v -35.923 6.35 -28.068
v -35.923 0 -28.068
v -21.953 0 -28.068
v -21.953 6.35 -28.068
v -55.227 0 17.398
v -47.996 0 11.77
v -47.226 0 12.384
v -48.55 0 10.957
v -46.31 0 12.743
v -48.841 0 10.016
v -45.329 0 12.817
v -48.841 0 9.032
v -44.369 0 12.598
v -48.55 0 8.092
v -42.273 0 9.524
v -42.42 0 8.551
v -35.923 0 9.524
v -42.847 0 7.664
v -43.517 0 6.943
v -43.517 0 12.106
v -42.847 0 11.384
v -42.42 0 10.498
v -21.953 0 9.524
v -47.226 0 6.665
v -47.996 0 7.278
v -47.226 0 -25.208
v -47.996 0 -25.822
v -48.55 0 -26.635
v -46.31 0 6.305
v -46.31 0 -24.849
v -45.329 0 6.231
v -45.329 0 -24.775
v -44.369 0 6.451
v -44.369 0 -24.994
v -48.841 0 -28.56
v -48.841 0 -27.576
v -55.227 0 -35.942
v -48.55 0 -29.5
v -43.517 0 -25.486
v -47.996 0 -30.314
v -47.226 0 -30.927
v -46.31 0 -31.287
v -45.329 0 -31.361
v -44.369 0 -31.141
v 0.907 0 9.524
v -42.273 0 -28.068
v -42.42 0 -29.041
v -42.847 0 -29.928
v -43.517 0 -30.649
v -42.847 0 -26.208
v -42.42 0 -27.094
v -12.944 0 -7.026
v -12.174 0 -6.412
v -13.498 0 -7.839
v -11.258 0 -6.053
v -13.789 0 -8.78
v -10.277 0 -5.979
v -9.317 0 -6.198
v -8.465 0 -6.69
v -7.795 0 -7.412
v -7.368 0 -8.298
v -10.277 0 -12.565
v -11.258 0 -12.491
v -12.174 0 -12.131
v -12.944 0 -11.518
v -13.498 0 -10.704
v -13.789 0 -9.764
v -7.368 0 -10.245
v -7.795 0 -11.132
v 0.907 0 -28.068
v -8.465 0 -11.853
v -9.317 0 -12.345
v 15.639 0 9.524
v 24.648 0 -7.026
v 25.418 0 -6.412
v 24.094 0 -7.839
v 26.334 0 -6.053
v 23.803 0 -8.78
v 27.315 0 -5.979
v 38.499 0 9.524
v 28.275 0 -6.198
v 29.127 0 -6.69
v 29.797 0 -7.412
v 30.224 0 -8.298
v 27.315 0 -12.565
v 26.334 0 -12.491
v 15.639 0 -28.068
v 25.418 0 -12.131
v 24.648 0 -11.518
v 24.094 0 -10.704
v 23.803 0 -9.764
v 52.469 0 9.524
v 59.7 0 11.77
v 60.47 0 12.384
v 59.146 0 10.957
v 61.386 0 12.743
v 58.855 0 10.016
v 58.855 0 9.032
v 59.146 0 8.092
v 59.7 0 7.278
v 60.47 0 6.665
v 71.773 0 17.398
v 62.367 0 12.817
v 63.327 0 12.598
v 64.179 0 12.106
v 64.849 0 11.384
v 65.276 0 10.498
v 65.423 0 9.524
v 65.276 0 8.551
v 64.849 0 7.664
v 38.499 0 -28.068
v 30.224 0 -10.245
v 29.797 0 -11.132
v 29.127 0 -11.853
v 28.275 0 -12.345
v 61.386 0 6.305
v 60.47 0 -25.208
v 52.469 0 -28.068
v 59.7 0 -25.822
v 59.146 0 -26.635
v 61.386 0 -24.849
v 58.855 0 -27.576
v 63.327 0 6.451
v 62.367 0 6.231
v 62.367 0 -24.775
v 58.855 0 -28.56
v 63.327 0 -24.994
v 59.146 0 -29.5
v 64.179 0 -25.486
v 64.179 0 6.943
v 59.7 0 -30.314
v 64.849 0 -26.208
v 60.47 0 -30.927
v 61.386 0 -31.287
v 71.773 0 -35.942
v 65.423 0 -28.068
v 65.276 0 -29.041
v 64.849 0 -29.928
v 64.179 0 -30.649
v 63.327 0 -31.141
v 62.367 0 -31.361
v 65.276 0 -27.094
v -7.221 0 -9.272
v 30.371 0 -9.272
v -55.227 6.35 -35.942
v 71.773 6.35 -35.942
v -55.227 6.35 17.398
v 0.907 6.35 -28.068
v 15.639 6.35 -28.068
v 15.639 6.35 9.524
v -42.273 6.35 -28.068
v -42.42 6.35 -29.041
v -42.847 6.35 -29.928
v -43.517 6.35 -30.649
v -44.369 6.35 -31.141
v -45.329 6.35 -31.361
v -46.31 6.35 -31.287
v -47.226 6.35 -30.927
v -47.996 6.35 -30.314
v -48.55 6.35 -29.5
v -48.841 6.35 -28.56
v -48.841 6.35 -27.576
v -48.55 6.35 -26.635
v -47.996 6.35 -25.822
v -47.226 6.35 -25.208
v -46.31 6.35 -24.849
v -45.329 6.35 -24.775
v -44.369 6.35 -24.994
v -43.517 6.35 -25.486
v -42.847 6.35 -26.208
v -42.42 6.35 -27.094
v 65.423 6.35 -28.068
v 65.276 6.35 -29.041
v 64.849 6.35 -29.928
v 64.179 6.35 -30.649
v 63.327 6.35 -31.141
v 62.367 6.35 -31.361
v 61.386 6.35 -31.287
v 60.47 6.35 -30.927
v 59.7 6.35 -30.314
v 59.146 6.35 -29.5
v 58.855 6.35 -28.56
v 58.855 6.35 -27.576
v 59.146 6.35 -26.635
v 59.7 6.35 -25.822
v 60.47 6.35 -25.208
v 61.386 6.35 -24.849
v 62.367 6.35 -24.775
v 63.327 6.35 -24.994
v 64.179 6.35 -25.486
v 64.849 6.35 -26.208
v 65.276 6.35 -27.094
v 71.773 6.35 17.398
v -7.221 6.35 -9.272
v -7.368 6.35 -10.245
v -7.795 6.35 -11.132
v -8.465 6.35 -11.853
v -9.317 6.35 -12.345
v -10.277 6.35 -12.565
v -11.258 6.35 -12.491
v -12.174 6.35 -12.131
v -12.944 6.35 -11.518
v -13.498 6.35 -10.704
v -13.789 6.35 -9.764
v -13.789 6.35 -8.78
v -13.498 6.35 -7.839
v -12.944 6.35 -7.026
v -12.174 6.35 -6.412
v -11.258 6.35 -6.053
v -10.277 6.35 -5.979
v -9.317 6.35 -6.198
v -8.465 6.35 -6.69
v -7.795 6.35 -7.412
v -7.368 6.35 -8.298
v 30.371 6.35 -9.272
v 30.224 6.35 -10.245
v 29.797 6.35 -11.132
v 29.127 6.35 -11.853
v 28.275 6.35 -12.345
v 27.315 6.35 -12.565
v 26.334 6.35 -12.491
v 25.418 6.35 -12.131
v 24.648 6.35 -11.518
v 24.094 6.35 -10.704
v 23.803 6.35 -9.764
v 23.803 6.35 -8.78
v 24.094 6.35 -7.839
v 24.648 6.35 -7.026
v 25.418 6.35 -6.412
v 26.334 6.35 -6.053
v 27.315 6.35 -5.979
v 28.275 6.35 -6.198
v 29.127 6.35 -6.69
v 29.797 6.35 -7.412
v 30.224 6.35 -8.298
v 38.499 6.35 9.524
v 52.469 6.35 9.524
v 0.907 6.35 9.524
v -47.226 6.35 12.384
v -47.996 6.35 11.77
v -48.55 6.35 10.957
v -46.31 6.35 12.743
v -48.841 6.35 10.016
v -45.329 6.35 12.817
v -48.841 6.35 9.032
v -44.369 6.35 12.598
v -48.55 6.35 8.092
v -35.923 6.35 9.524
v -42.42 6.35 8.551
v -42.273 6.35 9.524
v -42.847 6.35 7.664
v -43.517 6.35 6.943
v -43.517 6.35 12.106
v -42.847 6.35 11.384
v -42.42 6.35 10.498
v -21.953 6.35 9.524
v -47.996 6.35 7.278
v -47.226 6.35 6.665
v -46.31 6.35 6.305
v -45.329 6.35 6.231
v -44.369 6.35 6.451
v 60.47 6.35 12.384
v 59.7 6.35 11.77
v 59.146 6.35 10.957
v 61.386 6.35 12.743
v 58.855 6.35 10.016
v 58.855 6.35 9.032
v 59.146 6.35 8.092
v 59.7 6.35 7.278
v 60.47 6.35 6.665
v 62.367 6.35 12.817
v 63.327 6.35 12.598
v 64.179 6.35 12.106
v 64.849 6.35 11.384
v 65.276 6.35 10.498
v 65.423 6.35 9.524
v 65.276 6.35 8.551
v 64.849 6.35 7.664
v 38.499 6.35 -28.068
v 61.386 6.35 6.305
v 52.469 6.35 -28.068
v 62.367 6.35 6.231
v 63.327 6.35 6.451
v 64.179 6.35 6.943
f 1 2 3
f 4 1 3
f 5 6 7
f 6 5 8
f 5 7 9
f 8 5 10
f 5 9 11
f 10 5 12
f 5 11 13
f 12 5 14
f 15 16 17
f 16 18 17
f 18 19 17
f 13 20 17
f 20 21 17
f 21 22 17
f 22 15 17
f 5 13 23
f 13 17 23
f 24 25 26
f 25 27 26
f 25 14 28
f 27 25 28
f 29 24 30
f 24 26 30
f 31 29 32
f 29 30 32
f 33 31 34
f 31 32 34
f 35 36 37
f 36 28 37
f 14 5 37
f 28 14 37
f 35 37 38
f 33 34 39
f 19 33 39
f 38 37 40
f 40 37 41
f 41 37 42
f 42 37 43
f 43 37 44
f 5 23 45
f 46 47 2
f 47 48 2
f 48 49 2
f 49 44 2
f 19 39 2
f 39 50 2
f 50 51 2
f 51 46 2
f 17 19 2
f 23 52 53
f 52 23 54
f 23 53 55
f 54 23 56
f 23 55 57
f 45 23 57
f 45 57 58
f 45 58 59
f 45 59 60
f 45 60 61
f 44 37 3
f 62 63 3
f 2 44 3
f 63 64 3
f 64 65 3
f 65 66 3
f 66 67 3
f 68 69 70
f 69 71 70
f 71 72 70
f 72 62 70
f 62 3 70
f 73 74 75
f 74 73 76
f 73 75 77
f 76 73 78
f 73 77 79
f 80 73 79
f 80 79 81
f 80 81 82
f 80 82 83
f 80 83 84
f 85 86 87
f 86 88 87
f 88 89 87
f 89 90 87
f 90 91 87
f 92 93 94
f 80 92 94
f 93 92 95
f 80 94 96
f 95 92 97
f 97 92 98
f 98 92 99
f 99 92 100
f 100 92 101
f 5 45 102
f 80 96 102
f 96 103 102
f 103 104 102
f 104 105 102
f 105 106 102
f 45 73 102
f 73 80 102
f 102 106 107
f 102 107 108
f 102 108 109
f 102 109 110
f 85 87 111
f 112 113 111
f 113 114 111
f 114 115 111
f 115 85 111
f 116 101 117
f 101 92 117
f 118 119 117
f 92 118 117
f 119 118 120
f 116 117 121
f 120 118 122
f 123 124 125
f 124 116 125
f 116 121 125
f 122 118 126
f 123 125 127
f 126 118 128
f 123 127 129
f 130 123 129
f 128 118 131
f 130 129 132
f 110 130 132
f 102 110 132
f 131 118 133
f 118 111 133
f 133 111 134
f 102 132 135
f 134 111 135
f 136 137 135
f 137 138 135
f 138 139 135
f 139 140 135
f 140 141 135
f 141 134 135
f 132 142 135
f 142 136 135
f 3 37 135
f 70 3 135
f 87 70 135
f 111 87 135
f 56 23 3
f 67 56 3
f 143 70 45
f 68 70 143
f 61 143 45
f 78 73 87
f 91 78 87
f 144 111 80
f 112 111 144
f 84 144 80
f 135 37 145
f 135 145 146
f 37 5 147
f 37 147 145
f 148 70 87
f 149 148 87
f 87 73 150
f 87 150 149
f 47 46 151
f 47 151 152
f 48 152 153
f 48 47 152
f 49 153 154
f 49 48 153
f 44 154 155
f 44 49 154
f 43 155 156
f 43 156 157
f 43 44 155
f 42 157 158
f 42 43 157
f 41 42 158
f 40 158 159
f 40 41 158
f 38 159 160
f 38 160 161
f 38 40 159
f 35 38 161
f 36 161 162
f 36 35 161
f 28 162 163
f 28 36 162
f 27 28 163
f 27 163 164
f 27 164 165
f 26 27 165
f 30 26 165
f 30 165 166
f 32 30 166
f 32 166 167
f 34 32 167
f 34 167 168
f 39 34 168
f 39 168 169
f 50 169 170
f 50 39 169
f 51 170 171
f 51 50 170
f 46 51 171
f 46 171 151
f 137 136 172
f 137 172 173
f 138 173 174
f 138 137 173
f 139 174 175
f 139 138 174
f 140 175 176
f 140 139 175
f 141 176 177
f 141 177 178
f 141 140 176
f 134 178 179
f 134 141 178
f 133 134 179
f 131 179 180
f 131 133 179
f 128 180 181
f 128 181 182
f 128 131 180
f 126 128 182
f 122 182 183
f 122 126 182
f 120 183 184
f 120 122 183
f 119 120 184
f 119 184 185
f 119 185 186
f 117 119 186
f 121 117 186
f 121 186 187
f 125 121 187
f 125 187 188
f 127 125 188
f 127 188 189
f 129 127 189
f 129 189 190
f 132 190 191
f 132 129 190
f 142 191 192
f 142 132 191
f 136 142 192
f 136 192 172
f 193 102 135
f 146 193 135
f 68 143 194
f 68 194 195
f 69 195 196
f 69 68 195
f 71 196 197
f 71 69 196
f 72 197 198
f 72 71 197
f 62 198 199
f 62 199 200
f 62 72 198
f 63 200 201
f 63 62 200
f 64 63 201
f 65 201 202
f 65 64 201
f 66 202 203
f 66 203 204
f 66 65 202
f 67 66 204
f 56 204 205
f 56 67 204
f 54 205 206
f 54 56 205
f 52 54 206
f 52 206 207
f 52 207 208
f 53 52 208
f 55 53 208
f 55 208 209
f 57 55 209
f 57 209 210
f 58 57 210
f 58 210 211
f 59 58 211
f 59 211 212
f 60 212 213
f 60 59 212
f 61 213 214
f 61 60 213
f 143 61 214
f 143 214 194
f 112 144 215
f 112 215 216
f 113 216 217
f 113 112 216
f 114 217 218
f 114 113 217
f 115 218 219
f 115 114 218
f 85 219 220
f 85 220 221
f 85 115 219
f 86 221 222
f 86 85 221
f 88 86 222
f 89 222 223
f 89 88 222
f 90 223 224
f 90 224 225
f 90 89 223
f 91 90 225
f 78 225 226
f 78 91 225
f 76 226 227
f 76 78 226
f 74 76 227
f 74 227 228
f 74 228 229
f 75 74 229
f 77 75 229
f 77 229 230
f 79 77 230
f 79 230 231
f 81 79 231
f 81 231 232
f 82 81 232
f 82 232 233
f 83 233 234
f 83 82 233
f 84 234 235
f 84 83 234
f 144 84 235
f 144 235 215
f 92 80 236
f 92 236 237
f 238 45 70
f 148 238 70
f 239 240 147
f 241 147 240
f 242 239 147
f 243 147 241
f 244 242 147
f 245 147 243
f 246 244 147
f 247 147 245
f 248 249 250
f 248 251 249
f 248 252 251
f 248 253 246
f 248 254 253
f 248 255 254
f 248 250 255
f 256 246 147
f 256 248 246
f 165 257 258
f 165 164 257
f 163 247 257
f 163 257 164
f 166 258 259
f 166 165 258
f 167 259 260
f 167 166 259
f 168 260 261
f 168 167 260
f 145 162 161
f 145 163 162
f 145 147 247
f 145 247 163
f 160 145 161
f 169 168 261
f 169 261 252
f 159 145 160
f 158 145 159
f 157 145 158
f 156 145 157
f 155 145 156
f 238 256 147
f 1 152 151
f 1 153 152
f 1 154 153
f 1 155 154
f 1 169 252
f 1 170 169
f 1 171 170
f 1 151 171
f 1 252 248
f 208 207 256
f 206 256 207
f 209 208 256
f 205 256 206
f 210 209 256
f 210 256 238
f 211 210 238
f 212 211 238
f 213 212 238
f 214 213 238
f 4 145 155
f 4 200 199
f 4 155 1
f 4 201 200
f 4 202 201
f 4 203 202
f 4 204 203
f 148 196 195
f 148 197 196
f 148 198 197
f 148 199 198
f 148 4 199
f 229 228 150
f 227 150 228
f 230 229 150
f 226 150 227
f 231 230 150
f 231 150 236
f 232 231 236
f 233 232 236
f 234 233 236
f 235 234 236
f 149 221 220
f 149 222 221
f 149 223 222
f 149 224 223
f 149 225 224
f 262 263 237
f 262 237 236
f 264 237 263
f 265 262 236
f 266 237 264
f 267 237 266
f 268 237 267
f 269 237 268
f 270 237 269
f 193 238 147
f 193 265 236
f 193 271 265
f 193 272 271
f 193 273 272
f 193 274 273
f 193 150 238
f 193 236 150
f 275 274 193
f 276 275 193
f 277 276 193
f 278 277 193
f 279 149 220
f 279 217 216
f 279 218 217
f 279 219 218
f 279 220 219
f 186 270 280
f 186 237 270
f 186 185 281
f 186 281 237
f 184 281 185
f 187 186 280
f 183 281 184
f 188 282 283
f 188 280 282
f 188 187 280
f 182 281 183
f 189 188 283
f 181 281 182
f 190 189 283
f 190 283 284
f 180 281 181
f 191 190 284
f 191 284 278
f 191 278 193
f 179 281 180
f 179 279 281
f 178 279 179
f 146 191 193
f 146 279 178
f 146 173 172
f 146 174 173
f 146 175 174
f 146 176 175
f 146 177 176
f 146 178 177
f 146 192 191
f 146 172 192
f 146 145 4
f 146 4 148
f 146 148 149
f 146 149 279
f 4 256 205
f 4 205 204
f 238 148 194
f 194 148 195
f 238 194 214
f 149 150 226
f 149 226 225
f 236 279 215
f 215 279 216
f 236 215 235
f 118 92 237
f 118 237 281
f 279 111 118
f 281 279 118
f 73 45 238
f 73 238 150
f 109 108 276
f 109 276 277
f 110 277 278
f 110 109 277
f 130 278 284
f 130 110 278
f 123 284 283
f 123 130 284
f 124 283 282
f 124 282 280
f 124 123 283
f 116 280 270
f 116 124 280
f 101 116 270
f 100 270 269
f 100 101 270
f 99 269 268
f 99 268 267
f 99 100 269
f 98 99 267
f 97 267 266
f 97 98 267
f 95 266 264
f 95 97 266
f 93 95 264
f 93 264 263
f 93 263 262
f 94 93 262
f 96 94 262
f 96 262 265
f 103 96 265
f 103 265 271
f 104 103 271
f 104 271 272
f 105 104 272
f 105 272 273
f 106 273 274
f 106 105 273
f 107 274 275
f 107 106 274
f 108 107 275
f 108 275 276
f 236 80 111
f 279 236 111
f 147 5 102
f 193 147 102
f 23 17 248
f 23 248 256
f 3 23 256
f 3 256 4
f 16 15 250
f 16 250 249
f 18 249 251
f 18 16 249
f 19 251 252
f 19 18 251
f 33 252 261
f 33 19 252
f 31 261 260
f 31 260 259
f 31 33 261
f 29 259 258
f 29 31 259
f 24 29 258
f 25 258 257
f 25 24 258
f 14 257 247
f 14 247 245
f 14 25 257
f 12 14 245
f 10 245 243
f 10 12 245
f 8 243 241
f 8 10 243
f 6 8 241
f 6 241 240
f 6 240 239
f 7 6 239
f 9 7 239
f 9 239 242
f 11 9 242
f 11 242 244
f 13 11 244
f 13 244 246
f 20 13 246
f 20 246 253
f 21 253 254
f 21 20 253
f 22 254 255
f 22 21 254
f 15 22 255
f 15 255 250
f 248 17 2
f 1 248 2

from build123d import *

# Parameters (mm, degrees)
SKETCH1_W           = 127
SKETCH1_H           = 53.34
SKETCH1_R           = 3.302
SKETCH1_W_2         = 13.97
SKETCH1_H_2         = 37.592
SKETCH1_W_3         = 14.732
BOSS_EXTRUDE1_DEPTH = 6.35


with BuildPart() as part:
    # Sketch1 → Boss-Extrude1 (new body)
    with BuildSketch(Plane(origin=(0, 0, 0), x_dir=(1, 0, 0), z_dir=(0, 1, 0))):
        with Locations((8.27250506, 9.271742923)):
            Rectangle(SKETCH1_W, SKETCH1_H)
        with Locations((-45.57549494, -9.524257077)):
            Circle(SKETCH1_R, mode=Mode.SUBTRACT)
        with Locations((-45.57549494, 28.067742923)):
            Circle(SKETCH1_R, mode=Mode.SUBTRACT)
        with Locations((62.12050506, -9.524257077)):
            Circle(SKETCH1_R, mode=Mode.SUBTRACT)
        with Locations((62.12050506, 28.067742923)):
            Circle(SKETCH1_R, mode=Mode.SUBTRACT)
        with Locations((-10.52349494, 9.271742923)):
            Circle(SKETCH1_R, mode=Mode.SUBTRACT)
        with Locations((27.06850506, 9.271742923)):
            Circle(SKETCH1_R, mode=Mode.SUBTRACT)
        with Locations((-28.93849494, 9.271742923)):
            Rectangle(SKETCH1_W_2, SKETCH1_H_2, mode=Mode.SUBTRACT)
        with Locations((45.48350506, 9.271742923)):
            Rectangle(SKETCH1_W_2, SKETCH1_H_2, mode=Mode.SUBTRACT)
        with Locations((8.27250506, 9.271742923)):
            Rectangle(SKETCH1_W_3, SKETCH1_H_2, mode=Mode.SUBTRACT)
    extrude(amount=BOSS_EXTRUDE1_DEPTH)


solid = part.part
